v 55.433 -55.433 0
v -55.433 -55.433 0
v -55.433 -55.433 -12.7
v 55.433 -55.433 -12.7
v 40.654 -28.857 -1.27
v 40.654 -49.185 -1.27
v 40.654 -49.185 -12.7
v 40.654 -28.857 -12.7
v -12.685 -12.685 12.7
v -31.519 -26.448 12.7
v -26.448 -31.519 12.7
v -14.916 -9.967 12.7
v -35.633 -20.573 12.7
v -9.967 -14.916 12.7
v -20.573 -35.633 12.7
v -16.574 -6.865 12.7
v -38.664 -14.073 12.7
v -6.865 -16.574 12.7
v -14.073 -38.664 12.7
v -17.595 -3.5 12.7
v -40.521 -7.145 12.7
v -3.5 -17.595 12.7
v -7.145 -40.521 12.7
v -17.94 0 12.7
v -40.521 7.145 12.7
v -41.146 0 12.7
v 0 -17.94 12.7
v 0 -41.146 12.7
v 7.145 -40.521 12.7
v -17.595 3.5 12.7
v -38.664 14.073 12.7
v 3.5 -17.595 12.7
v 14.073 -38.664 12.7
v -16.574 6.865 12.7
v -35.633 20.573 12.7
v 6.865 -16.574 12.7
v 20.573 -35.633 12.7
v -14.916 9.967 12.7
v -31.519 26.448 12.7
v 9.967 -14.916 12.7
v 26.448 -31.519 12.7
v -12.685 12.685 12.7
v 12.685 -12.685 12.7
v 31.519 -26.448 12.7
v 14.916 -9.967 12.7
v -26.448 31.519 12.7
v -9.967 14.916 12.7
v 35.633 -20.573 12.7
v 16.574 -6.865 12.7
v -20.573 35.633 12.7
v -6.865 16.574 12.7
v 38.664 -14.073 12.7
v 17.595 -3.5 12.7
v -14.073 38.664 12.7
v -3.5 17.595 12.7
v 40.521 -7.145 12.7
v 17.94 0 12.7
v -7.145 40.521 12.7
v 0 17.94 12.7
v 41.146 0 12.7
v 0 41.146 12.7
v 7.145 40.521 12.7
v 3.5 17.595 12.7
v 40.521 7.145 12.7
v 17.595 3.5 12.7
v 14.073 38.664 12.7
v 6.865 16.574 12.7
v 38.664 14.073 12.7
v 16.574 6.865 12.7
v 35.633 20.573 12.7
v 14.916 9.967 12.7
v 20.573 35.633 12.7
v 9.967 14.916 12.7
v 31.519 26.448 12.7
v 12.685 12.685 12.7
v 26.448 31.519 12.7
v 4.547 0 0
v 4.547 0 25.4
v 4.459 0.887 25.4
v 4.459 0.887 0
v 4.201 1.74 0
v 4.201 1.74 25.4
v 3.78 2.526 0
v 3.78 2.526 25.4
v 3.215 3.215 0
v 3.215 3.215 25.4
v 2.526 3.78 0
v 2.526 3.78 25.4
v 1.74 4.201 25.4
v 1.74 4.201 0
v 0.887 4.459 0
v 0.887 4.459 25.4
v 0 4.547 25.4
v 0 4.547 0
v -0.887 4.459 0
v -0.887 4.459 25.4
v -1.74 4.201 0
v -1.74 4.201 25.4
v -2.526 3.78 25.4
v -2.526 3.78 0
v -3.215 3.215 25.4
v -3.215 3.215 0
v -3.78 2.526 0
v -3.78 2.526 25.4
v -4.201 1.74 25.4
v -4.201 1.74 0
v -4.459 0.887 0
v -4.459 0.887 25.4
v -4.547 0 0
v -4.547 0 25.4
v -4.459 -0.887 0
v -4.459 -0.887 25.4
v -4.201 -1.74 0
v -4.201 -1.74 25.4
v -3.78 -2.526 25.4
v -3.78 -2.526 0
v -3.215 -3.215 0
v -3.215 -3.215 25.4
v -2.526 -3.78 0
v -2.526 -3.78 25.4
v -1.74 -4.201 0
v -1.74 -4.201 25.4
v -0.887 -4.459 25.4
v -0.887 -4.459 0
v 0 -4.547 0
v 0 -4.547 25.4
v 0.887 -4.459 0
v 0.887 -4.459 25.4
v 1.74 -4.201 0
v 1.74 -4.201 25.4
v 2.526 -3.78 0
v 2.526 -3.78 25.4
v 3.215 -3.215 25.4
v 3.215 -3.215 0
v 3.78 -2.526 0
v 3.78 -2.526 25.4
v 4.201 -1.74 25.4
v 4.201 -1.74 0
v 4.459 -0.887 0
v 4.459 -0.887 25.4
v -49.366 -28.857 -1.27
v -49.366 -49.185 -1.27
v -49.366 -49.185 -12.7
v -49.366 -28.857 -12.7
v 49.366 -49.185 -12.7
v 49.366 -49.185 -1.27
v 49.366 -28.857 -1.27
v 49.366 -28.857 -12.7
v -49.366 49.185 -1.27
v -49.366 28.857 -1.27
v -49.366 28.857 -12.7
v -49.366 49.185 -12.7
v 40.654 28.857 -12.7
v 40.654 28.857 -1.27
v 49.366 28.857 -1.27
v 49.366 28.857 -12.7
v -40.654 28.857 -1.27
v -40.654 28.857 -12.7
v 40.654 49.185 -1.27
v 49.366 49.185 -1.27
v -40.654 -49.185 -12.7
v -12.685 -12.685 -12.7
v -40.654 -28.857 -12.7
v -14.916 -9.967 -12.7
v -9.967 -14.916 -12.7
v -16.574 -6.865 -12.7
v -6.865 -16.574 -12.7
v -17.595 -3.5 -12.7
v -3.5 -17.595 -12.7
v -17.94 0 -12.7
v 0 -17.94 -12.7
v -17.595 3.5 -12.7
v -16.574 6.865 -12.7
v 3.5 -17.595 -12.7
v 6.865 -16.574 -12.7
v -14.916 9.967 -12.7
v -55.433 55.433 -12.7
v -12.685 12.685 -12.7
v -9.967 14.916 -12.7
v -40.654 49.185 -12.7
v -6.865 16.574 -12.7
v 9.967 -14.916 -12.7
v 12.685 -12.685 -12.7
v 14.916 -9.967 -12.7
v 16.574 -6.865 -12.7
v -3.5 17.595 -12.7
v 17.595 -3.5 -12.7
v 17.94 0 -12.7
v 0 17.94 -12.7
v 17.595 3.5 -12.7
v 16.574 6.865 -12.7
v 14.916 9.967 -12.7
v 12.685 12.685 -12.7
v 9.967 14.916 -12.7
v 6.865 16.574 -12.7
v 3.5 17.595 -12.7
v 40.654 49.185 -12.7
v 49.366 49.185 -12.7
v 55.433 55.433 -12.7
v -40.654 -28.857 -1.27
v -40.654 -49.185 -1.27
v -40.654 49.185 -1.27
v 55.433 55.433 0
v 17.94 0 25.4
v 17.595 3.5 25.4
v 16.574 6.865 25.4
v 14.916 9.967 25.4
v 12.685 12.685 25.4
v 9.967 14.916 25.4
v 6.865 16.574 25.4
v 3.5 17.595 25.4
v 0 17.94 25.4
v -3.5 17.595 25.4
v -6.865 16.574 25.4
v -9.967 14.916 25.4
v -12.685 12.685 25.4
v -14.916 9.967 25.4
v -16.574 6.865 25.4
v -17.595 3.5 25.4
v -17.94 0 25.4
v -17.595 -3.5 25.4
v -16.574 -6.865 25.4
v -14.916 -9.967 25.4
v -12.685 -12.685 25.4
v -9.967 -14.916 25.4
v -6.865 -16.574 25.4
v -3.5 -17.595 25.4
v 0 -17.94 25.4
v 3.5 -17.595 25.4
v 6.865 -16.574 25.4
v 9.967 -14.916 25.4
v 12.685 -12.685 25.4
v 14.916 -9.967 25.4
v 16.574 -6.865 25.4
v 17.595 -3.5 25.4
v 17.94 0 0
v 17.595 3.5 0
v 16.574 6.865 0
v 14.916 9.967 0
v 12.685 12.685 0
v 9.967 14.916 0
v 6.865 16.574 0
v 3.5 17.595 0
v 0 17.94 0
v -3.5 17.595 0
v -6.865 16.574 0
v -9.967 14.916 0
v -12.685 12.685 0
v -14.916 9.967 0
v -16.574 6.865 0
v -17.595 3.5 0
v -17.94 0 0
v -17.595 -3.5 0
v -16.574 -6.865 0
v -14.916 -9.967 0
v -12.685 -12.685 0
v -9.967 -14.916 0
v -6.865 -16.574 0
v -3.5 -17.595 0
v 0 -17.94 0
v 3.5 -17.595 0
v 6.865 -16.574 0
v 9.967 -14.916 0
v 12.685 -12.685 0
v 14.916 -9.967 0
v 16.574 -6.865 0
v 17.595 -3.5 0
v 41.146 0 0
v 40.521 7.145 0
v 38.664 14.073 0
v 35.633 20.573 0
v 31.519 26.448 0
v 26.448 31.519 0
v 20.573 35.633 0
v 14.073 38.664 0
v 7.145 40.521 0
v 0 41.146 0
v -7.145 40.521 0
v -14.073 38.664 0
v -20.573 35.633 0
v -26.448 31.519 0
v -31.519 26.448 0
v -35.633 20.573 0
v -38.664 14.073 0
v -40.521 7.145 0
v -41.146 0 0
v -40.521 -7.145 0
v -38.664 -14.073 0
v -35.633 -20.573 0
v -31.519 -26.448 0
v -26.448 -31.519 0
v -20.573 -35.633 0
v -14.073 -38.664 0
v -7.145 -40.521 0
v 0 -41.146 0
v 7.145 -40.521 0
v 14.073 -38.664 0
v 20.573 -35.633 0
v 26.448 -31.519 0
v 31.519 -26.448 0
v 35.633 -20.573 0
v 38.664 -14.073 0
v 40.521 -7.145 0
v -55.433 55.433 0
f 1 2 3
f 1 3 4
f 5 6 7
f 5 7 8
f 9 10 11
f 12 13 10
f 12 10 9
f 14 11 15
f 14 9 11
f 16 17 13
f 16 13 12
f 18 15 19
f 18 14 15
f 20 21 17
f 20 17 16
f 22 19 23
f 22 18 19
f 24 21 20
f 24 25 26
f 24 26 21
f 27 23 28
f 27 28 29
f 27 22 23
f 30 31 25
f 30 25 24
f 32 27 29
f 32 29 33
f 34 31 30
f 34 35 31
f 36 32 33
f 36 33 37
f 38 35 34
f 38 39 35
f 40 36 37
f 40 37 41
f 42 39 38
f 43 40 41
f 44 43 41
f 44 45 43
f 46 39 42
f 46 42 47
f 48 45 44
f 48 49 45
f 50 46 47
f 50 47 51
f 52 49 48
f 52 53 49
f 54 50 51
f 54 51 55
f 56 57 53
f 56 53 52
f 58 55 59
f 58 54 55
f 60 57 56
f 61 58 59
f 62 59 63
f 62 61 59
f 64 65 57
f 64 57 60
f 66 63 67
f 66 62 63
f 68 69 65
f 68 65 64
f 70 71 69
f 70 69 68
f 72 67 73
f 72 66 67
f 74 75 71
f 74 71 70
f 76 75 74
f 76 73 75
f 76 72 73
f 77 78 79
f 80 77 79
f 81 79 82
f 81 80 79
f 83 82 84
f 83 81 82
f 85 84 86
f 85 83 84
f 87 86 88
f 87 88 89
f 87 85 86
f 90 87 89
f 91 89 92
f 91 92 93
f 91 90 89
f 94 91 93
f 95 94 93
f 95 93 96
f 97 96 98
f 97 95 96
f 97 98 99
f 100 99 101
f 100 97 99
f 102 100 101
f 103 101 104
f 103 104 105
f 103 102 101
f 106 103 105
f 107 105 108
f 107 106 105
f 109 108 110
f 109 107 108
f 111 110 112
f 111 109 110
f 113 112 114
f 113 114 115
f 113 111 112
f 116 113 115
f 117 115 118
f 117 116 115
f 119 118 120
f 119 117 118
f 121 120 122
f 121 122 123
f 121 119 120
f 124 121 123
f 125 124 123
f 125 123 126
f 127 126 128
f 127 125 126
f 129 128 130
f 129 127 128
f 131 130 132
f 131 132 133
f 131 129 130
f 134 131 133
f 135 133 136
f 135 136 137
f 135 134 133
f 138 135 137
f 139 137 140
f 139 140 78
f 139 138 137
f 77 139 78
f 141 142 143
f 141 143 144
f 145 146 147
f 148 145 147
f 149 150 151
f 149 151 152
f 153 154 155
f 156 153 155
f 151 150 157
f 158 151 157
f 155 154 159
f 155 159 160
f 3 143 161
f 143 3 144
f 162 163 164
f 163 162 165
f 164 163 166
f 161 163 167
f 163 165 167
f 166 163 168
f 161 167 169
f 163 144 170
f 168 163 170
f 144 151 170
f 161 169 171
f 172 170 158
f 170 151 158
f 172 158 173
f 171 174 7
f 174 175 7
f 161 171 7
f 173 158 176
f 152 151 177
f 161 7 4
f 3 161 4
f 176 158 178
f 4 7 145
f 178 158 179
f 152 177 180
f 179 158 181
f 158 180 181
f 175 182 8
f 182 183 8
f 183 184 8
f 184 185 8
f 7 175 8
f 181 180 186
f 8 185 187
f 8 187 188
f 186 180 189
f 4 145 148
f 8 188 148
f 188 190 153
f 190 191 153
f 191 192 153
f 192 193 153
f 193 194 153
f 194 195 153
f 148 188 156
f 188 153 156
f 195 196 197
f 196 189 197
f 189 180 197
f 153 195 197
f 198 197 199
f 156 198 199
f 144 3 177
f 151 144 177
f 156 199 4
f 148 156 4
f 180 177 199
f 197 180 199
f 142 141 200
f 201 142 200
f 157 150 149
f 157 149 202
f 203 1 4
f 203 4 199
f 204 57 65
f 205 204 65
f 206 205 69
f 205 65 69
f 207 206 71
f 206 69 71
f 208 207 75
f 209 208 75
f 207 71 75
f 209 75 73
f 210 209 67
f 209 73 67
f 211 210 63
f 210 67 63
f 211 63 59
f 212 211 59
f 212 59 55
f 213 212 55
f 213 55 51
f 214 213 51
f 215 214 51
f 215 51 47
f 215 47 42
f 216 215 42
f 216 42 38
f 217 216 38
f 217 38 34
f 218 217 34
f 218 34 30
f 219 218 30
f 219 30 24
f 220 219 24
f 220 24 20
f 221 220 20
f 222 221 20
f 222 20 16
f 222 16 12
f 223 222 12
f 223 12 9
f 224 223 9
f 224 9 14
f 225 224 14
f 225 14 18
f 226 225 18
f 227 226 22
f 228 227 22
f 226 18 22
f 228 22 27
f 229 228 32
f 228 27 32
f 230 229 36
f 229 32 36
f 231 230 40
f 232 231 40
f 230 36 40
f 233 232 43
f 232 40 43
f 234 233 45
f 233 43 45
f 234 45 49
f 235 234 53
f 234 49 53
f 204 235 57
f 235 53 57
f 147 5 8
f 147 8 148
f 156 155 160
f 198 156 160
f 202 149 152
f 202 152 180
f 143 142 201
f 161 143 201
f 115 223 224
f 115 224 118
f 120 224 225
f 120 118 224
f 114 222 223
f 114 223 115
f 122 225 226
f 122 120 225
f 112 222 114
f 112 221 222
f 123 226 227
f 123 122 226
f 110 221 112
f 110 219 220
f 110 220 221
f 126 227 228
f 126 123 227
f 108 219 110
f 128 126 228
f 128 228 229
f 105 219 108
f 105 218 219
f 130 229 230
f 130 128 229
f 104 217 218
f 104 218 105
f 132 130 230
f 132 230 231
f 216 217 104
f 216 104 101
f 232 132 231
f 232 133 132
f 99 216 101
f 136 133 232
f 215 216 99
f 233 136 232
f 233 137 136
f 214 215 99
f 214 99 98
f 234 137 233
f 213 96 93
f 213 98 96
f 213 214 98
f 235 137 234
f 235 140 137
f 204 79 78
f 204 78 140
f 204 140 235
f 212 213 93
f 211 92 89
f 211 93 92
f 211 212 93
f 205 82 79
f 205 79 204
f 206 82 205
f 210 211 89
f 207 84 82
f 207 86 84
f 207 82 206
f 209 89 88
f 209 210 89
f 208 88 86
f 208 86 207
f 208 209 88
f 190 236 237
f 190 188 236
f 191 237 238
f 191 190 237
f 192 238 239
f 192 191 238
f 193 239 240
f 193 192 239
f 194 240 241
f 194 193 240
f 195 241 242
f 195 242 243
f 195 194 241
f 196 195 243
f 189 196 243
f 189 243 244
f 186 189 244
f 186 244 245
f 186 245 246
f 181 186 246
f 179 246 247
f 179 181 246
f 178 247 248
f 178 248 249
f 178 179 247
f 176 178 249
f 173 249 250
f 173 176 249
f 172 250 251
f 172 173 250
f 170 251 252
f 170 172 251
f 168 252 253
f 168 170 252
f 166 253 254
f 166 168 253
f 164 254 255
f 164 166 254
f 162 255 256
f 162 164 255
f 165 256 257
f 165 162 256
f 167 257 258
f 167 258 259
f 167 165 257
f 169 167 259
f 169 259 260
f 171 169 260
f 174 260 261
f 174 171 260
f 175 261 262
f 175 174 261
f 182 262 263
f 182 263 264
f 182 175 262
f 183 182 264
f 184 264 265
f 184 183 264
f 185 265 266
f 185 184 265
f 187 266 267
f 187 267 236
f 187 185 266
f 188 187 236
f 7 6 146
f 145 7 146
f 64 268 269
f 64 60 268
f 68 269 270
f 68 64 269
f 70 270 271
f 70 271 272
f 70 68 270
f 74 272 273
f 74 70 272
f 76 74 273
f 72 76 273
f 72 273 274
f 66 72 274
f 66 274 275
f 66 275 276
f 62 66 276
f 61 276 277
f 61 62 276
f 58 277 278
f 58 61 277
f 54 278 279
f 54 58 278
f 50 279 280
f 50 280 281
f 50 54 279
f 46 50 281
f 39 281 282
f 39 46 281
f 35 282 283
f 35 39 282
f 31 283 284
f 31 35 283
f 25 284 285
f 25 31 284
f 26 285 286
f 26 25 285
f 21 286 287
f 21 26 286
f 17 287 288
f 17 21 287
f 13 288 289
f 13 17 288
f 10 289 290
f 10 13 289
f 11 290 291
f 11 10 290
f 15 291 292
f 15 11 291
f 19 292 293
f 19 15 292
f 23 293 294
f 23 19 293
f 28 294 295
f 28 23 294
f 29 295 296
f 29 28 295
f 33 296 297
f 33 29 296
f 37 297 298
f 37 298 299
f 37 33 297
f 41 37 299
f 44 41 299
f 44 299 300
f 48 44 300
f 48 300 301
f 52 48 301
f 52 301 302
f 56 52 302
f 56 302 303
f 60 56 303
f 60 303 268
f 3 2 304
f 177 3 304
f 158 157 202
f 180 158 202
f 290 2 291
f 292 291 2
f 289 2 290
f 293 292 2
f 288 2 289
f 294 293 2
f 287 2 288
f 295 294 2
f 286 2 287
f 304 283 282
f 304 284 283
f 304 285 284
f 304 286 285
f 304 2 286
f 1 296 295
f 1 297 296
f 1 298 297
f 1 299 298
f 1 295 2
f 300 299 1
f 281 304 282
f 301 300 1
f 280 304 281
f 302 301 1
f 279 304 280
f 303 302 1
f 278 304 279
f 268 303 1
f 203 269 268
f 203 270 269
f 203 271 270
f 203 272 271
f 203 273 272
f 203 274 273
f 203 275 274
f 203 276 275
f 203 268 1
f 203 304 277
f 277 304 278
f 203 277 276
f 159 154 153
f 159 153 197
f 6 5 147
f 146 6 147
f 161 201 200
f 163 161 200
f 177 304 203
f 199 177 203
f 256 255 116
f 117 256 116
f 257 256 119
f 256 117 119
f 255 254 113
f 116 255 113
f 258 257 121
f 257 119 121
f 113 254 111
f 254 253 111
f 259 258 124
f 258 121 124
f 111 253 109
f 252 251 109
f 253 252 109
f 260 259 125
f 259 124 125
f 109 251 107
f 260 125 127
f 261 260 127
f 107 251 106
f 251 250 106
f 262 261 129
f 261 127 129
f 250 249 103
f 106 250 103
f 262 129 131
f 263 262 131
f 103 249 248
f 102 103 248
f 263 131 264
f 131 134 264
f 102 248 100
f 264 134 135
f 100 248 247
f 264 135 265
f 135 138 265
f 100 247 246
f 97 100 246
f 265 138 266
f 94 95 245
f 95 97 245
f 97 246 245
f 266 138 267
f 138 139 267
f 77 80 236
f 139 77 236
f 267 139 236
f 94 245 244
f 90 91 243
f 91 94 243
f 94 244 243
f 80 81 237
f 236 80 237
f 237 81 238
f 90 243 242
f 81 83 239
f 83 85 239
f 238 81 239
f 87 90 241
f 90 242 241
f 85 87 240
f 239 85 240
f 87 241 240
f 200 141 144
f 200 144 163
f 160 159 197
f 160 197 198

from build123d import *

# Parameters (mm, degrees)
F0_R     = 17.939821
F0_R_2   = 4.5466
F1_DEPTH = 25.4
F0_R_3   = 41.14561
F2_DEPTH = 12.7
F0_W     = 110.865114
F0_H     = 110.865114
F0_W_2   = 8.71167
F0_H_2   = 20.327227
F3_DEPTH = 12.7
F4_DEPTH = 1.27


with BuildPart() as f1:
    # F0 (on Top) → F1 (new body)
    with BuildSketch(Plane.XY):
        Circle(F0_R)
        Circle(F0_R_2, mode=Mode.SUBTRACT)
    extrude(amount=F1_DEPTH)

    # F0 (on Top) → F2 (join, symmetric)
    with BuildSketch(Plane.XY):
        Circle(F0_R_3)
        Circle(F0_R, mode=Mode.SUBTRACT)
    extrude(amount=F2_DEPTH, both=True)

    # F0 (on Top) → F3 (join)
    with BuildSketch(Plane.XY):
        Rectangle(F0_W, F0_H)
        with Locations((-45.010282, -39.021014)):
            Rectangle(F0_W_2, F0_H_2, mode=Mode.SUBTRACT)
        with Locations((45.010282, -39.021014)):
            Rectangle(F0_W_2, F0_H_2, mode=Mode.SUBTRACT)
        Circle(F0_R_3, mode=Mode.SUBTRACT)
        with Locations((-45.010282, 39.021014)):
            Rectangle(F0_W_2, F0_H_2, mode=Mode.SUBTRACT)
        with Locations((45.010282, 39.021014)):
            Rectangle(F0_W_2, F0_H_2, mode=Mode.SUBTRACT)
    extrude(amount=-F3_DEPTH)

    # F0 (on Top) → F4 (join)
    with BuildSketch(Plane.XY):
        with Locations((-45.010282, 39.021014)):
            Rectangle(F0_W_2, F0_H_2)
        with Locations((45.010282, 39.021014)):
            Rectangle(F0_W_2, F0_H_2)
        with Locations((45.010282, -39.021014)):
            Rectangle(F0_W_2, F0_H_2)
        with Locations((-45.010282, -39.021014)):
            Rectangle(F0_W_2, F0_H_2)
    extrude(amount=-F4_DEPTH)


solid = f1.part
